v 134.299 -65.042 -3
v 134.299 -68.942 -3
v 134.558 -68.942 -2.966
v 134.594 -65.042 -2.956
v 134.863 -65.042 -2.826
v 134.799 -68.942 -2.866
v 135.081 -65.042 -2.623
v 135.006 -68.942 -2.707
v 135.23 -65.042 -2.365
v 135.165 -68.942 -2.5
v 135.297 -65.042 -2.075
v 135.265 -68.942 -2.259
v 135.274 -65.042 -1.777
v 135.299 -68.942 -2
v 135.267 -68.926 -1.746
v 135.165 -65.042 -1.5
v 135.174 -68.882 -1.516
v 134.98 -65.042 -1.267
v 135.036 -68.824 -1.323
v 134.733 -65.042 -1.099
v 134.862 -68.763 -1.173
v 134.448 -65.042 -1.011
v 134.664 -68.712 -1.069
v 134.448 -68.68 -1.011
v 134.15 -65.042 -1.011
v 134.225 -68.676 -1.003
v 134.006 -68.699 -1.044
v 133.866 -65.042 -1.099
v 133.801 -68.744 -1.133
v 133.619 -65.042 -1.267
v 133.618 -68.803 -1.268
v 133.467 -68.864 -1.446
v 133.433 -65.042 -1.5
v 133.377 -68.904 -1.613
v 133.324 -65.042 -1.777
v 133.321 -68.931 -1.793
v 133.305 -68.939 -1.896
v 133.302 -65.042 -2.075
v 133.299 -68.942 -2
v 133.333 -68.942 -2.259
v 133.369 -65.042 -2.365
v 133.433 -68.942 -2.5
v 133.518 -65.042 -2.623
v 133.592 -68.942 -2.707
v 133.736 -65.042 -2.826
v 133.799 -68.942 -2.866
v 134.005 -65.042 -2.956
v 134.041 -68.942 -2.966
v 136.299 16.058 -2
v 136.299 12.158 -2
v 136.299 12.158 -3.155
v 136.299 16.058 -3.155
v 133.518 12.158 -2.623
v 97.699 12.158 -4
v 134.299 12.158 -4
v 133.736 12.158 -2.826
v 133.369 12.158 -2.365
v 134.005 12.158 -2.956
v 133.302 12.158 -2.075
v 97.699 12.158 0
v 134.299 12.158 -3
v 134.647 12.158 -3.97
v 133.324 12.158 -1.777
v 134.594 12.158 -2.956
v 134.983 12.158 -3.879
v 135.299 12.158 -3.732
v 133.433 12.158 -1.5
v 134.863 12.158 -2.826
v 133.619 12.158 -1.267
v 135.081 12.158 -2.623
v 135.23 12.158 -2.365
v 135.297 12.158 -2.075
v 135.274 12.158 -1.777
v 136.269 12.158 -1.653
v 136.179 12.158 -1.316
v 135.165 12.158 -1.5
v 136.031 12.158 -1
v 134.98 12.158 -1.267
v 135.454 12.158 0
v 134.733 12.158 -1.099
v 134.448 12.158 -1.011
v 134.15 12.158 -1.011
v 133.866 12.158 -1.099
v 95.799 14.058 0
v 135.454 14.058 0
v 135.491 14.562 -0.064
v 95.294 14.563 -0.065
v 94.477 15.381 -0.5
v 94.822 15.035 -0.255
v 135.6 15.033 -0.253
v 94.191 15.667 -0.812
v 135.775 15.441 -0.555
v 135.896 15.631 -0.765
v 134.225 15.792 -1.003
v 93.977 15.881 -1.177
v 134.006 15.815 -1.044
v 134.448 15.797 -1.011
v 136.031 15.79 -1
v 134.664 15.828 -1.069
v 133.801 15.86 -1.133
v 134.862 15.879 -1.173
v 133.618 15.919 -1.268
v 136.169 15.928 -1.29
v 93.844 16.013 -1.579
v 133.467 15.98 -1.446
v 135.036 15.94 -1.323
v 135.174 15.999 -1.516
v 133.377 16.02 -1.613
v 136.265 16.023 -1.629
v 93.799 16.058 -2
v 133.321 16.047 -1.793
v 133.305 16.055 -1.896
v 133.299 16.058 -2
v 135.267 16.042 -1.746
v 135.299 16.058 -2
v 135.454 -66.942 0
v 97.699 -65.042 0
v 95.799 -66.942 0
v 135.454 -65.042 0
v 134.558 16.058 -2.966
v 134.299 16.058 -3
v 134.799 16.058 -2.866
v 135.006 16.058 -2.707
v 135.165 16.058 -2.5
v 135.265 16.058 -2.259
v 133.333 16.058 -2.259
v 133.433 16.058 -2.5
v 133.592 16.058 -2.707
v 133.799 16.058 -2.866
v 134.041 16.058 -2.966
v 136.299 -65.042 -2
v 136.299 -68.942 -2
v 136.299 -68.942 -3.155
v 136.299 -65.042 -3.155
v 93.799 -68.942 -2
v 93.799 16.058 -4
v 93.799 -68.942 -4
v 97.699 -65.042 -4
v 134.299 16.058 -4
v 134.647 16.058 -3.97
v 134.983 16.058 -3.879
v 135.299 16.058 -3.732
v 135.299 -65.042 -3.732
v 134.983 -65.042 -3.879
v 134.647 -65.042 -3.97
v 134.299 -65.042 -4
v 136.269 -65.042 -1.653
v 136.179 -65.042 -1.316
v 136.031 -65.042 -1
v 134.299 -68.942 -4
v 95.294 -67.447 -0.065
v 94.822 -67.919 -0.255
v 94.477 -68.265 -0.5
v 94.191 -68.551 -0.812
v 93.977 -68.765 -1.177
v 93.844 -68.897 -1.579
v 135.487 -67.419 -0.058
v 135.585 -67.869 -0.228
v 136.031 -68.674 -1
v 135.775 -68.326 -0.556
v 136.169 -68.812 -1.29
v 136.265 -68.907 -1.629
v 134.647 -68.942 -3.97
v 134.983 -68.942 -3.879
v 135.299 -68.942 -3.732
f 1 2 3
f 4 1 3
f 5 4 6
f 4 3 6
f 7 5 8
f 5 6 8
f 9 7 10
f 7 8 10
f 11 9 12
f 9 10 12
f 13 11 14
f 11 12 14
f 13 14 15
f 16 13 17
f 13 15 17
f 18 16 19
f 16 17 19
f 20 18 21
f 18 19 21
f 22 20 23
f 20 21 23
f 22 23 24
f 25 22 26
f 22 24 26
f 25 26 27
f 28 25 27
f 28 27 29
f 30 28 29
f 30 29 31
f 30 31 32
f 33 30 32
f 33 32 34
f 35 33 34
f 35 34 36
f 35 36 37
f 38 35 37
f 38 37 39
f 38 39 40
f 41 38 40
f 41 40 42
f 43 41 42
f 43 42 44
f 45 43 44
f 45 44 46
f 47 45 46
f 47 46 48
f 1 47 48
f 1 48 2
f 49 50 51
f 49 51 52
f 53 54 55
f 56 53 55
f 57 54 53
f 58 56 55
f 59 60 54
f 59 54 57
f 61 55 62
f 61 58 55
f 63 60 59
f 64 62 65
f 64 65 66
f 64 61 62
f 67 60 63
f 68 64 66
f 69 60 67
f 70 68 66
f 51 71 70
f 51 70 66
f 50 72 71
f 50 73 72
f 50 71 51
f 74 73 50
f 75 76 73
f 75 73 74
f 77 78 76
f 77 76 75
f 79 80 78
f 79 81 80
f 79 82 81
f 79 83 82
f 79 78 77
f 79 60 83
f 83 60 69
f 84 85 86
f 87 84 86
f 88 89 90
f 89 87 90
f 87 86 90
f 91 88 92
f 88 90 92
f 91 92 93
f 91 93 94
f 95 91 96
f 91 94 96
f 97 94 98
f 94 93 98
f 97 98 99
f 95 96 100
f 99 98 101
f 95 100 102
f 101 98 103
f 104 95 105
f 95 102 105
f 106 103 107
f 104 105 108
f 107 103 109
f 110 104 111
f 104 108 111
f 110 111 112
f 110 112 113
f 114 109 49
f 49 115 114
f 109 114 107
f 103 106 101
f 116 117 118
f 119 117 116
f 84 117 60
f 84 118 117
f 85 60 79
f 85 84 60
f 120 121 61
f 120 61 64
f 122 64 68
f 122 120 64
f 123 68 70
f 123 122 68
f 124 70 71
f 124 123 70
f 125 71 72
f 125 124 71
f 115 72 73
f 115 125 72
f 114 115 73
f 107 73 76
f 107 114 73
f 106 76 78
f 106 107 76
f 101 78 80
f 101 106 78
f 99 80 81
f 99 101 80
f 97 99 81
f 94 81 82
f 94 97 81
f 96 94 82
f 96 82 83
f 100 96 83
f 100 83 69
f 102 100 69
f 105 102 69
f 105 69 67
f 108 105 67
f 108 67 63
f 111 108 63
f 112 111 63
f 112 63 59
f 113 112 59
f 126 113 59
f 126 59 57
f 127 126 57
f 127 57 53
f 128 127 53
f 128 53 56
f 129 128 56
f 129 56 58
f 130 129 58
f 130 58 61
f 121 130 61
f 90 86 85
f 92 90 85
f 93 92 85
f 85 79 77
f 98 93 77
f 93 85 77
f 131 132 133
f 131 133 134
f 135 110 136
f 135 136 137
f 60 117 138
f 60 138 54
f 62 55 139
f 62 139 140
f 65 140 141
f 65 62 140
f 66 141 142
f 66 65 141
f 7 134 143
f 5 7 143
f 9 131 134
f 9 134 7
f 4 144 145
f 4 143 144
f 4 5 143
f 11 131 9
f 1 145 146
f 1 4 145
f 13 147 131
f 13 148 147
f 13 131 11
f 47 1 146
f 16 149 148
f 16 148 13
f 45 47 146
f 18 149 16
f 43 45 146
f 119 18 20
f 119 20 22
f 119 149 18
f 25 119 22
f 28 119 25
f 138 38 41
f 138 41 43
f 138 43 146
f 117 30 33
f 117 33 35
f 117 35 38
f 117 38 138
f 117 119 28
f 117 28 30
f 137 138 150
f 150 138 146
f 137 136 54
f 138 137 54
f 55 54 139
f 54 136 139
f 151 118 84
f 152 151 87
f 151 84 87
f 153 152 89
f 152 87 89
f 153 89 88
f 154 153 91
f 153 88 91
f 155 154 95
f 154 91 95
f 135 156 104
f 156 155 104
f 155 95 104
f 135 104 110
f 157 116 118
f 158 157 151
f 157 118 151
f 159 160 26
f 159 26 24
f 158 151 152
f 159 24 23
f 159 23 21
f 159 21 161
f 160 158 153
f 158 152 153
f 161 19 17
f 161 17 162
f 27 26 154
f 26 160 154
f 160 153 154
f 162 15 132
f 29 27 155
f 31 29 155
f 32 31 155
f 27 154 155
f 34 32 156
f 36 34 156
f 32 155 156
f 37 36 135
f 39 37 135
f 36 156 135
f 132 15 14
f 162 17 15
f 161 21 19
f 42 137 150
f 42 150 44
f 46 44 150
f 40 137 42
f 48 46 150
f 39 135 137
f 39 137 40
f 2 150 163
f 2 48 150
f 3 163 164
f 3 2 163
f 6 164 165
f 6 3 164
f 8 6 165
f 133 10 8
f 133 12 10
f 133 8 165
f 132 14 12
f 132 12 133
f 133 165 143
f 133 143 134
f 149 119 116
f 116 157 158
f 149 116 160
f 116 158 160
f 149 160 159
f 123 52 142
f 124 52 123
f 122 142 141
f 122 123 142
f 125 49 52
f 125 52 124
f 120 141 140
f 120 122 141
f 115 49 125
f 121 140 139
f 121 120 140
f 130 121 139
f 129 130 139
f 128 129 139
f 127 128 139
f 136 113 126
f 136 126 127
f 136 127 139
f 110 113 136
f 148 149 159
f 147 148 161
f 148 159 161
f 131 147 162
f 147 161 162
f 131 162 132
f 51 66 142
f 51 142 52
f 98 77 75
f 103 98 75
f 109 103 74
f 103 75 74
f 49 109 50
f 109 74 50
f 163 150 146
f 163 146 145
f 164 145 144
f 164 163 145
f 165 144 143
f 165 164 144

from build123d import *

# Parameters (mm, degrees)
EXTRUDE_1_DEPTH          = 4
CUT_EXTRUDE_1_REACH      = 162.681
SKETCH_2_R               = 1
CUT_EXTRUDE_2_DEPTH      = 161.68143152
CUT_EXTRUDE_2_DEPTH_BACK = 161.68143152
FILLET_1_R               = 2


with BuildPart() as part:
    # 草图1 → 凸台-拉伸1 (new body)
    with BuildSketch(Plane.XY):
        Polygon((136.299385308, -68.941921014), (136.299385308, -65.041921014), (97.699385308, -65.041921014), (97.699385308, 12.158078986), (136.299385308, 12.158078986), (136.299385308, 16.058078986), (93.799385308, 16.058078986), (93.799385308, -68.941921014), align=None)
    extrude(amount=-EXTRUDE_1_DEPTH)

    # 草图2 → 切除-拉伸1 (cut, up to next)
    with BuildSketch(Plane.XZ.offset(68.941921014), mode=Mode.PRIVATE) as cut_extrude_1_sk1:
        with Locations(Location((134.299385308, -2, 0), (0, 0, 270))):
            Circle(SKETCH_2_R)
    cut_extrude_1_tool1 = extrude(cut_extrude_1_sk1.sketch, amount=-CUT_EXTRUDE_1_REACH, mode=Mode.PRIVATE) & part.part
    cut_extrude_1 = cut_extrude_1_tool1.solids().sort_by_distance((134.299385, -68.941921, -2))[0]
    add(cut_extrude_1, mode=Mode.SUBTRACT)

    # 镜向1: 切除-拉伸1 across plane
    add(cut_extrude_1.mirror(Plane(origin=(0, -26.441921014, 0), x_dir=(0, 0, 1), z_dir=(0, -1, 0))), mode=Mode.SUBTRACT)

    # 草图3 → 切除-拉伸2 (cut, two sides: drawn at the far end of the back side and taken through both)
    with BuildSketch(Plane(origin=(0, 16.058078986, 0), x_dir=(1, 0, 0), z_dir=(0, 1, 0)).offset(-CUT_EXTRUDE_2_DEPTH_BACK)):
        with BuildLine():
            Line((136.299385308, 3.154700538), (136.299385308, 4))
            Line((136.299385308, 4), (134.299385308, 4))
            ThreePointArc((134.299385308, 4), (134.817023399, 3.931851653), (135.299385308, 3.732050808))
            Line((135.299385308, 3.732050808), (136.299385308, 3.154700538))
        make_face()
        with BuildLine():
            Line((135.454085847, 0), (136.031436116, 1))
            ThreePointArc((136.031436116, 1), (136.231236961, 1.48236191), (136.299385308, 2))
            Line((136.299385308, 2), (136.299385308, 1.464101615))
            Line((136.299385308, 1.464101615), (136.299385308, 0))
            Line((136.299385308, 0), (135.454085847, 0))
        make_face()
    extrude(amount=CUT_EXTRUDE_2_DEPTH + CUT_EXTRUDE_2_DEPTH_BACK, mode=Mode.SUBTRACT)

    # 圆角1
    # the kernel refuses this fillet: 2 mm, written as the material it takes off along each edge
    with BuildSketch(Plane(origin=(140.454085847, 16.058078986, 0), x_dir=(0, -1, 0), z_dir=(-1, 0, 0))) as fillet_1_piece_1:
        with BuildLine():
            CenterArc((FILLET_1_R, -FILLET_1_R), FILLET_1_R, 90, 90)
            Line((0, -FILLET_1_R), (0, 0))
            Line((0, 0), (FILLET_1_R, 0))
        make_face()
    extrude(amount=51.654700538, mode=Mode.SUBTRACT)
    with BuildSketch(Plane(origin=(93.799385308, 21.058078986, 0), x_dir=(1, 0, 0), z_dir=(0, -1, 0))) as fillet_1_piece_2:
        with BuildLine():
            CenterArc((FILLET_1_R, -FILLET_1_R), FILLET_1_R, 90, 90)
            Line((0, -FILLET_1_R), (0, 0))
            Line((0, 0), (FILLET_1_R, 0))
        make_face()
    extrude(amount=95, mode=Mode.SUBTRACT)
    with BuildSketch(Plane(origin=(88.799385308, -68.941921014, 0), x_dir=(0, 0, -1), z_dir=(1, 0, 0))) as fillet_1_piece_3:
        with BuildLine():
            CenterArc((FILLET_1_R, FILLET_1_R), FILLET_1_R, 180, 90)
            Line((0, FILLET_1_R), (0, 0))
            Line((0, 0), (FILLET_1_R, 0))
        make_face()
    extrude(amount=51.654700538, mode=Mode.SUBTRACT)


solid = part.part
